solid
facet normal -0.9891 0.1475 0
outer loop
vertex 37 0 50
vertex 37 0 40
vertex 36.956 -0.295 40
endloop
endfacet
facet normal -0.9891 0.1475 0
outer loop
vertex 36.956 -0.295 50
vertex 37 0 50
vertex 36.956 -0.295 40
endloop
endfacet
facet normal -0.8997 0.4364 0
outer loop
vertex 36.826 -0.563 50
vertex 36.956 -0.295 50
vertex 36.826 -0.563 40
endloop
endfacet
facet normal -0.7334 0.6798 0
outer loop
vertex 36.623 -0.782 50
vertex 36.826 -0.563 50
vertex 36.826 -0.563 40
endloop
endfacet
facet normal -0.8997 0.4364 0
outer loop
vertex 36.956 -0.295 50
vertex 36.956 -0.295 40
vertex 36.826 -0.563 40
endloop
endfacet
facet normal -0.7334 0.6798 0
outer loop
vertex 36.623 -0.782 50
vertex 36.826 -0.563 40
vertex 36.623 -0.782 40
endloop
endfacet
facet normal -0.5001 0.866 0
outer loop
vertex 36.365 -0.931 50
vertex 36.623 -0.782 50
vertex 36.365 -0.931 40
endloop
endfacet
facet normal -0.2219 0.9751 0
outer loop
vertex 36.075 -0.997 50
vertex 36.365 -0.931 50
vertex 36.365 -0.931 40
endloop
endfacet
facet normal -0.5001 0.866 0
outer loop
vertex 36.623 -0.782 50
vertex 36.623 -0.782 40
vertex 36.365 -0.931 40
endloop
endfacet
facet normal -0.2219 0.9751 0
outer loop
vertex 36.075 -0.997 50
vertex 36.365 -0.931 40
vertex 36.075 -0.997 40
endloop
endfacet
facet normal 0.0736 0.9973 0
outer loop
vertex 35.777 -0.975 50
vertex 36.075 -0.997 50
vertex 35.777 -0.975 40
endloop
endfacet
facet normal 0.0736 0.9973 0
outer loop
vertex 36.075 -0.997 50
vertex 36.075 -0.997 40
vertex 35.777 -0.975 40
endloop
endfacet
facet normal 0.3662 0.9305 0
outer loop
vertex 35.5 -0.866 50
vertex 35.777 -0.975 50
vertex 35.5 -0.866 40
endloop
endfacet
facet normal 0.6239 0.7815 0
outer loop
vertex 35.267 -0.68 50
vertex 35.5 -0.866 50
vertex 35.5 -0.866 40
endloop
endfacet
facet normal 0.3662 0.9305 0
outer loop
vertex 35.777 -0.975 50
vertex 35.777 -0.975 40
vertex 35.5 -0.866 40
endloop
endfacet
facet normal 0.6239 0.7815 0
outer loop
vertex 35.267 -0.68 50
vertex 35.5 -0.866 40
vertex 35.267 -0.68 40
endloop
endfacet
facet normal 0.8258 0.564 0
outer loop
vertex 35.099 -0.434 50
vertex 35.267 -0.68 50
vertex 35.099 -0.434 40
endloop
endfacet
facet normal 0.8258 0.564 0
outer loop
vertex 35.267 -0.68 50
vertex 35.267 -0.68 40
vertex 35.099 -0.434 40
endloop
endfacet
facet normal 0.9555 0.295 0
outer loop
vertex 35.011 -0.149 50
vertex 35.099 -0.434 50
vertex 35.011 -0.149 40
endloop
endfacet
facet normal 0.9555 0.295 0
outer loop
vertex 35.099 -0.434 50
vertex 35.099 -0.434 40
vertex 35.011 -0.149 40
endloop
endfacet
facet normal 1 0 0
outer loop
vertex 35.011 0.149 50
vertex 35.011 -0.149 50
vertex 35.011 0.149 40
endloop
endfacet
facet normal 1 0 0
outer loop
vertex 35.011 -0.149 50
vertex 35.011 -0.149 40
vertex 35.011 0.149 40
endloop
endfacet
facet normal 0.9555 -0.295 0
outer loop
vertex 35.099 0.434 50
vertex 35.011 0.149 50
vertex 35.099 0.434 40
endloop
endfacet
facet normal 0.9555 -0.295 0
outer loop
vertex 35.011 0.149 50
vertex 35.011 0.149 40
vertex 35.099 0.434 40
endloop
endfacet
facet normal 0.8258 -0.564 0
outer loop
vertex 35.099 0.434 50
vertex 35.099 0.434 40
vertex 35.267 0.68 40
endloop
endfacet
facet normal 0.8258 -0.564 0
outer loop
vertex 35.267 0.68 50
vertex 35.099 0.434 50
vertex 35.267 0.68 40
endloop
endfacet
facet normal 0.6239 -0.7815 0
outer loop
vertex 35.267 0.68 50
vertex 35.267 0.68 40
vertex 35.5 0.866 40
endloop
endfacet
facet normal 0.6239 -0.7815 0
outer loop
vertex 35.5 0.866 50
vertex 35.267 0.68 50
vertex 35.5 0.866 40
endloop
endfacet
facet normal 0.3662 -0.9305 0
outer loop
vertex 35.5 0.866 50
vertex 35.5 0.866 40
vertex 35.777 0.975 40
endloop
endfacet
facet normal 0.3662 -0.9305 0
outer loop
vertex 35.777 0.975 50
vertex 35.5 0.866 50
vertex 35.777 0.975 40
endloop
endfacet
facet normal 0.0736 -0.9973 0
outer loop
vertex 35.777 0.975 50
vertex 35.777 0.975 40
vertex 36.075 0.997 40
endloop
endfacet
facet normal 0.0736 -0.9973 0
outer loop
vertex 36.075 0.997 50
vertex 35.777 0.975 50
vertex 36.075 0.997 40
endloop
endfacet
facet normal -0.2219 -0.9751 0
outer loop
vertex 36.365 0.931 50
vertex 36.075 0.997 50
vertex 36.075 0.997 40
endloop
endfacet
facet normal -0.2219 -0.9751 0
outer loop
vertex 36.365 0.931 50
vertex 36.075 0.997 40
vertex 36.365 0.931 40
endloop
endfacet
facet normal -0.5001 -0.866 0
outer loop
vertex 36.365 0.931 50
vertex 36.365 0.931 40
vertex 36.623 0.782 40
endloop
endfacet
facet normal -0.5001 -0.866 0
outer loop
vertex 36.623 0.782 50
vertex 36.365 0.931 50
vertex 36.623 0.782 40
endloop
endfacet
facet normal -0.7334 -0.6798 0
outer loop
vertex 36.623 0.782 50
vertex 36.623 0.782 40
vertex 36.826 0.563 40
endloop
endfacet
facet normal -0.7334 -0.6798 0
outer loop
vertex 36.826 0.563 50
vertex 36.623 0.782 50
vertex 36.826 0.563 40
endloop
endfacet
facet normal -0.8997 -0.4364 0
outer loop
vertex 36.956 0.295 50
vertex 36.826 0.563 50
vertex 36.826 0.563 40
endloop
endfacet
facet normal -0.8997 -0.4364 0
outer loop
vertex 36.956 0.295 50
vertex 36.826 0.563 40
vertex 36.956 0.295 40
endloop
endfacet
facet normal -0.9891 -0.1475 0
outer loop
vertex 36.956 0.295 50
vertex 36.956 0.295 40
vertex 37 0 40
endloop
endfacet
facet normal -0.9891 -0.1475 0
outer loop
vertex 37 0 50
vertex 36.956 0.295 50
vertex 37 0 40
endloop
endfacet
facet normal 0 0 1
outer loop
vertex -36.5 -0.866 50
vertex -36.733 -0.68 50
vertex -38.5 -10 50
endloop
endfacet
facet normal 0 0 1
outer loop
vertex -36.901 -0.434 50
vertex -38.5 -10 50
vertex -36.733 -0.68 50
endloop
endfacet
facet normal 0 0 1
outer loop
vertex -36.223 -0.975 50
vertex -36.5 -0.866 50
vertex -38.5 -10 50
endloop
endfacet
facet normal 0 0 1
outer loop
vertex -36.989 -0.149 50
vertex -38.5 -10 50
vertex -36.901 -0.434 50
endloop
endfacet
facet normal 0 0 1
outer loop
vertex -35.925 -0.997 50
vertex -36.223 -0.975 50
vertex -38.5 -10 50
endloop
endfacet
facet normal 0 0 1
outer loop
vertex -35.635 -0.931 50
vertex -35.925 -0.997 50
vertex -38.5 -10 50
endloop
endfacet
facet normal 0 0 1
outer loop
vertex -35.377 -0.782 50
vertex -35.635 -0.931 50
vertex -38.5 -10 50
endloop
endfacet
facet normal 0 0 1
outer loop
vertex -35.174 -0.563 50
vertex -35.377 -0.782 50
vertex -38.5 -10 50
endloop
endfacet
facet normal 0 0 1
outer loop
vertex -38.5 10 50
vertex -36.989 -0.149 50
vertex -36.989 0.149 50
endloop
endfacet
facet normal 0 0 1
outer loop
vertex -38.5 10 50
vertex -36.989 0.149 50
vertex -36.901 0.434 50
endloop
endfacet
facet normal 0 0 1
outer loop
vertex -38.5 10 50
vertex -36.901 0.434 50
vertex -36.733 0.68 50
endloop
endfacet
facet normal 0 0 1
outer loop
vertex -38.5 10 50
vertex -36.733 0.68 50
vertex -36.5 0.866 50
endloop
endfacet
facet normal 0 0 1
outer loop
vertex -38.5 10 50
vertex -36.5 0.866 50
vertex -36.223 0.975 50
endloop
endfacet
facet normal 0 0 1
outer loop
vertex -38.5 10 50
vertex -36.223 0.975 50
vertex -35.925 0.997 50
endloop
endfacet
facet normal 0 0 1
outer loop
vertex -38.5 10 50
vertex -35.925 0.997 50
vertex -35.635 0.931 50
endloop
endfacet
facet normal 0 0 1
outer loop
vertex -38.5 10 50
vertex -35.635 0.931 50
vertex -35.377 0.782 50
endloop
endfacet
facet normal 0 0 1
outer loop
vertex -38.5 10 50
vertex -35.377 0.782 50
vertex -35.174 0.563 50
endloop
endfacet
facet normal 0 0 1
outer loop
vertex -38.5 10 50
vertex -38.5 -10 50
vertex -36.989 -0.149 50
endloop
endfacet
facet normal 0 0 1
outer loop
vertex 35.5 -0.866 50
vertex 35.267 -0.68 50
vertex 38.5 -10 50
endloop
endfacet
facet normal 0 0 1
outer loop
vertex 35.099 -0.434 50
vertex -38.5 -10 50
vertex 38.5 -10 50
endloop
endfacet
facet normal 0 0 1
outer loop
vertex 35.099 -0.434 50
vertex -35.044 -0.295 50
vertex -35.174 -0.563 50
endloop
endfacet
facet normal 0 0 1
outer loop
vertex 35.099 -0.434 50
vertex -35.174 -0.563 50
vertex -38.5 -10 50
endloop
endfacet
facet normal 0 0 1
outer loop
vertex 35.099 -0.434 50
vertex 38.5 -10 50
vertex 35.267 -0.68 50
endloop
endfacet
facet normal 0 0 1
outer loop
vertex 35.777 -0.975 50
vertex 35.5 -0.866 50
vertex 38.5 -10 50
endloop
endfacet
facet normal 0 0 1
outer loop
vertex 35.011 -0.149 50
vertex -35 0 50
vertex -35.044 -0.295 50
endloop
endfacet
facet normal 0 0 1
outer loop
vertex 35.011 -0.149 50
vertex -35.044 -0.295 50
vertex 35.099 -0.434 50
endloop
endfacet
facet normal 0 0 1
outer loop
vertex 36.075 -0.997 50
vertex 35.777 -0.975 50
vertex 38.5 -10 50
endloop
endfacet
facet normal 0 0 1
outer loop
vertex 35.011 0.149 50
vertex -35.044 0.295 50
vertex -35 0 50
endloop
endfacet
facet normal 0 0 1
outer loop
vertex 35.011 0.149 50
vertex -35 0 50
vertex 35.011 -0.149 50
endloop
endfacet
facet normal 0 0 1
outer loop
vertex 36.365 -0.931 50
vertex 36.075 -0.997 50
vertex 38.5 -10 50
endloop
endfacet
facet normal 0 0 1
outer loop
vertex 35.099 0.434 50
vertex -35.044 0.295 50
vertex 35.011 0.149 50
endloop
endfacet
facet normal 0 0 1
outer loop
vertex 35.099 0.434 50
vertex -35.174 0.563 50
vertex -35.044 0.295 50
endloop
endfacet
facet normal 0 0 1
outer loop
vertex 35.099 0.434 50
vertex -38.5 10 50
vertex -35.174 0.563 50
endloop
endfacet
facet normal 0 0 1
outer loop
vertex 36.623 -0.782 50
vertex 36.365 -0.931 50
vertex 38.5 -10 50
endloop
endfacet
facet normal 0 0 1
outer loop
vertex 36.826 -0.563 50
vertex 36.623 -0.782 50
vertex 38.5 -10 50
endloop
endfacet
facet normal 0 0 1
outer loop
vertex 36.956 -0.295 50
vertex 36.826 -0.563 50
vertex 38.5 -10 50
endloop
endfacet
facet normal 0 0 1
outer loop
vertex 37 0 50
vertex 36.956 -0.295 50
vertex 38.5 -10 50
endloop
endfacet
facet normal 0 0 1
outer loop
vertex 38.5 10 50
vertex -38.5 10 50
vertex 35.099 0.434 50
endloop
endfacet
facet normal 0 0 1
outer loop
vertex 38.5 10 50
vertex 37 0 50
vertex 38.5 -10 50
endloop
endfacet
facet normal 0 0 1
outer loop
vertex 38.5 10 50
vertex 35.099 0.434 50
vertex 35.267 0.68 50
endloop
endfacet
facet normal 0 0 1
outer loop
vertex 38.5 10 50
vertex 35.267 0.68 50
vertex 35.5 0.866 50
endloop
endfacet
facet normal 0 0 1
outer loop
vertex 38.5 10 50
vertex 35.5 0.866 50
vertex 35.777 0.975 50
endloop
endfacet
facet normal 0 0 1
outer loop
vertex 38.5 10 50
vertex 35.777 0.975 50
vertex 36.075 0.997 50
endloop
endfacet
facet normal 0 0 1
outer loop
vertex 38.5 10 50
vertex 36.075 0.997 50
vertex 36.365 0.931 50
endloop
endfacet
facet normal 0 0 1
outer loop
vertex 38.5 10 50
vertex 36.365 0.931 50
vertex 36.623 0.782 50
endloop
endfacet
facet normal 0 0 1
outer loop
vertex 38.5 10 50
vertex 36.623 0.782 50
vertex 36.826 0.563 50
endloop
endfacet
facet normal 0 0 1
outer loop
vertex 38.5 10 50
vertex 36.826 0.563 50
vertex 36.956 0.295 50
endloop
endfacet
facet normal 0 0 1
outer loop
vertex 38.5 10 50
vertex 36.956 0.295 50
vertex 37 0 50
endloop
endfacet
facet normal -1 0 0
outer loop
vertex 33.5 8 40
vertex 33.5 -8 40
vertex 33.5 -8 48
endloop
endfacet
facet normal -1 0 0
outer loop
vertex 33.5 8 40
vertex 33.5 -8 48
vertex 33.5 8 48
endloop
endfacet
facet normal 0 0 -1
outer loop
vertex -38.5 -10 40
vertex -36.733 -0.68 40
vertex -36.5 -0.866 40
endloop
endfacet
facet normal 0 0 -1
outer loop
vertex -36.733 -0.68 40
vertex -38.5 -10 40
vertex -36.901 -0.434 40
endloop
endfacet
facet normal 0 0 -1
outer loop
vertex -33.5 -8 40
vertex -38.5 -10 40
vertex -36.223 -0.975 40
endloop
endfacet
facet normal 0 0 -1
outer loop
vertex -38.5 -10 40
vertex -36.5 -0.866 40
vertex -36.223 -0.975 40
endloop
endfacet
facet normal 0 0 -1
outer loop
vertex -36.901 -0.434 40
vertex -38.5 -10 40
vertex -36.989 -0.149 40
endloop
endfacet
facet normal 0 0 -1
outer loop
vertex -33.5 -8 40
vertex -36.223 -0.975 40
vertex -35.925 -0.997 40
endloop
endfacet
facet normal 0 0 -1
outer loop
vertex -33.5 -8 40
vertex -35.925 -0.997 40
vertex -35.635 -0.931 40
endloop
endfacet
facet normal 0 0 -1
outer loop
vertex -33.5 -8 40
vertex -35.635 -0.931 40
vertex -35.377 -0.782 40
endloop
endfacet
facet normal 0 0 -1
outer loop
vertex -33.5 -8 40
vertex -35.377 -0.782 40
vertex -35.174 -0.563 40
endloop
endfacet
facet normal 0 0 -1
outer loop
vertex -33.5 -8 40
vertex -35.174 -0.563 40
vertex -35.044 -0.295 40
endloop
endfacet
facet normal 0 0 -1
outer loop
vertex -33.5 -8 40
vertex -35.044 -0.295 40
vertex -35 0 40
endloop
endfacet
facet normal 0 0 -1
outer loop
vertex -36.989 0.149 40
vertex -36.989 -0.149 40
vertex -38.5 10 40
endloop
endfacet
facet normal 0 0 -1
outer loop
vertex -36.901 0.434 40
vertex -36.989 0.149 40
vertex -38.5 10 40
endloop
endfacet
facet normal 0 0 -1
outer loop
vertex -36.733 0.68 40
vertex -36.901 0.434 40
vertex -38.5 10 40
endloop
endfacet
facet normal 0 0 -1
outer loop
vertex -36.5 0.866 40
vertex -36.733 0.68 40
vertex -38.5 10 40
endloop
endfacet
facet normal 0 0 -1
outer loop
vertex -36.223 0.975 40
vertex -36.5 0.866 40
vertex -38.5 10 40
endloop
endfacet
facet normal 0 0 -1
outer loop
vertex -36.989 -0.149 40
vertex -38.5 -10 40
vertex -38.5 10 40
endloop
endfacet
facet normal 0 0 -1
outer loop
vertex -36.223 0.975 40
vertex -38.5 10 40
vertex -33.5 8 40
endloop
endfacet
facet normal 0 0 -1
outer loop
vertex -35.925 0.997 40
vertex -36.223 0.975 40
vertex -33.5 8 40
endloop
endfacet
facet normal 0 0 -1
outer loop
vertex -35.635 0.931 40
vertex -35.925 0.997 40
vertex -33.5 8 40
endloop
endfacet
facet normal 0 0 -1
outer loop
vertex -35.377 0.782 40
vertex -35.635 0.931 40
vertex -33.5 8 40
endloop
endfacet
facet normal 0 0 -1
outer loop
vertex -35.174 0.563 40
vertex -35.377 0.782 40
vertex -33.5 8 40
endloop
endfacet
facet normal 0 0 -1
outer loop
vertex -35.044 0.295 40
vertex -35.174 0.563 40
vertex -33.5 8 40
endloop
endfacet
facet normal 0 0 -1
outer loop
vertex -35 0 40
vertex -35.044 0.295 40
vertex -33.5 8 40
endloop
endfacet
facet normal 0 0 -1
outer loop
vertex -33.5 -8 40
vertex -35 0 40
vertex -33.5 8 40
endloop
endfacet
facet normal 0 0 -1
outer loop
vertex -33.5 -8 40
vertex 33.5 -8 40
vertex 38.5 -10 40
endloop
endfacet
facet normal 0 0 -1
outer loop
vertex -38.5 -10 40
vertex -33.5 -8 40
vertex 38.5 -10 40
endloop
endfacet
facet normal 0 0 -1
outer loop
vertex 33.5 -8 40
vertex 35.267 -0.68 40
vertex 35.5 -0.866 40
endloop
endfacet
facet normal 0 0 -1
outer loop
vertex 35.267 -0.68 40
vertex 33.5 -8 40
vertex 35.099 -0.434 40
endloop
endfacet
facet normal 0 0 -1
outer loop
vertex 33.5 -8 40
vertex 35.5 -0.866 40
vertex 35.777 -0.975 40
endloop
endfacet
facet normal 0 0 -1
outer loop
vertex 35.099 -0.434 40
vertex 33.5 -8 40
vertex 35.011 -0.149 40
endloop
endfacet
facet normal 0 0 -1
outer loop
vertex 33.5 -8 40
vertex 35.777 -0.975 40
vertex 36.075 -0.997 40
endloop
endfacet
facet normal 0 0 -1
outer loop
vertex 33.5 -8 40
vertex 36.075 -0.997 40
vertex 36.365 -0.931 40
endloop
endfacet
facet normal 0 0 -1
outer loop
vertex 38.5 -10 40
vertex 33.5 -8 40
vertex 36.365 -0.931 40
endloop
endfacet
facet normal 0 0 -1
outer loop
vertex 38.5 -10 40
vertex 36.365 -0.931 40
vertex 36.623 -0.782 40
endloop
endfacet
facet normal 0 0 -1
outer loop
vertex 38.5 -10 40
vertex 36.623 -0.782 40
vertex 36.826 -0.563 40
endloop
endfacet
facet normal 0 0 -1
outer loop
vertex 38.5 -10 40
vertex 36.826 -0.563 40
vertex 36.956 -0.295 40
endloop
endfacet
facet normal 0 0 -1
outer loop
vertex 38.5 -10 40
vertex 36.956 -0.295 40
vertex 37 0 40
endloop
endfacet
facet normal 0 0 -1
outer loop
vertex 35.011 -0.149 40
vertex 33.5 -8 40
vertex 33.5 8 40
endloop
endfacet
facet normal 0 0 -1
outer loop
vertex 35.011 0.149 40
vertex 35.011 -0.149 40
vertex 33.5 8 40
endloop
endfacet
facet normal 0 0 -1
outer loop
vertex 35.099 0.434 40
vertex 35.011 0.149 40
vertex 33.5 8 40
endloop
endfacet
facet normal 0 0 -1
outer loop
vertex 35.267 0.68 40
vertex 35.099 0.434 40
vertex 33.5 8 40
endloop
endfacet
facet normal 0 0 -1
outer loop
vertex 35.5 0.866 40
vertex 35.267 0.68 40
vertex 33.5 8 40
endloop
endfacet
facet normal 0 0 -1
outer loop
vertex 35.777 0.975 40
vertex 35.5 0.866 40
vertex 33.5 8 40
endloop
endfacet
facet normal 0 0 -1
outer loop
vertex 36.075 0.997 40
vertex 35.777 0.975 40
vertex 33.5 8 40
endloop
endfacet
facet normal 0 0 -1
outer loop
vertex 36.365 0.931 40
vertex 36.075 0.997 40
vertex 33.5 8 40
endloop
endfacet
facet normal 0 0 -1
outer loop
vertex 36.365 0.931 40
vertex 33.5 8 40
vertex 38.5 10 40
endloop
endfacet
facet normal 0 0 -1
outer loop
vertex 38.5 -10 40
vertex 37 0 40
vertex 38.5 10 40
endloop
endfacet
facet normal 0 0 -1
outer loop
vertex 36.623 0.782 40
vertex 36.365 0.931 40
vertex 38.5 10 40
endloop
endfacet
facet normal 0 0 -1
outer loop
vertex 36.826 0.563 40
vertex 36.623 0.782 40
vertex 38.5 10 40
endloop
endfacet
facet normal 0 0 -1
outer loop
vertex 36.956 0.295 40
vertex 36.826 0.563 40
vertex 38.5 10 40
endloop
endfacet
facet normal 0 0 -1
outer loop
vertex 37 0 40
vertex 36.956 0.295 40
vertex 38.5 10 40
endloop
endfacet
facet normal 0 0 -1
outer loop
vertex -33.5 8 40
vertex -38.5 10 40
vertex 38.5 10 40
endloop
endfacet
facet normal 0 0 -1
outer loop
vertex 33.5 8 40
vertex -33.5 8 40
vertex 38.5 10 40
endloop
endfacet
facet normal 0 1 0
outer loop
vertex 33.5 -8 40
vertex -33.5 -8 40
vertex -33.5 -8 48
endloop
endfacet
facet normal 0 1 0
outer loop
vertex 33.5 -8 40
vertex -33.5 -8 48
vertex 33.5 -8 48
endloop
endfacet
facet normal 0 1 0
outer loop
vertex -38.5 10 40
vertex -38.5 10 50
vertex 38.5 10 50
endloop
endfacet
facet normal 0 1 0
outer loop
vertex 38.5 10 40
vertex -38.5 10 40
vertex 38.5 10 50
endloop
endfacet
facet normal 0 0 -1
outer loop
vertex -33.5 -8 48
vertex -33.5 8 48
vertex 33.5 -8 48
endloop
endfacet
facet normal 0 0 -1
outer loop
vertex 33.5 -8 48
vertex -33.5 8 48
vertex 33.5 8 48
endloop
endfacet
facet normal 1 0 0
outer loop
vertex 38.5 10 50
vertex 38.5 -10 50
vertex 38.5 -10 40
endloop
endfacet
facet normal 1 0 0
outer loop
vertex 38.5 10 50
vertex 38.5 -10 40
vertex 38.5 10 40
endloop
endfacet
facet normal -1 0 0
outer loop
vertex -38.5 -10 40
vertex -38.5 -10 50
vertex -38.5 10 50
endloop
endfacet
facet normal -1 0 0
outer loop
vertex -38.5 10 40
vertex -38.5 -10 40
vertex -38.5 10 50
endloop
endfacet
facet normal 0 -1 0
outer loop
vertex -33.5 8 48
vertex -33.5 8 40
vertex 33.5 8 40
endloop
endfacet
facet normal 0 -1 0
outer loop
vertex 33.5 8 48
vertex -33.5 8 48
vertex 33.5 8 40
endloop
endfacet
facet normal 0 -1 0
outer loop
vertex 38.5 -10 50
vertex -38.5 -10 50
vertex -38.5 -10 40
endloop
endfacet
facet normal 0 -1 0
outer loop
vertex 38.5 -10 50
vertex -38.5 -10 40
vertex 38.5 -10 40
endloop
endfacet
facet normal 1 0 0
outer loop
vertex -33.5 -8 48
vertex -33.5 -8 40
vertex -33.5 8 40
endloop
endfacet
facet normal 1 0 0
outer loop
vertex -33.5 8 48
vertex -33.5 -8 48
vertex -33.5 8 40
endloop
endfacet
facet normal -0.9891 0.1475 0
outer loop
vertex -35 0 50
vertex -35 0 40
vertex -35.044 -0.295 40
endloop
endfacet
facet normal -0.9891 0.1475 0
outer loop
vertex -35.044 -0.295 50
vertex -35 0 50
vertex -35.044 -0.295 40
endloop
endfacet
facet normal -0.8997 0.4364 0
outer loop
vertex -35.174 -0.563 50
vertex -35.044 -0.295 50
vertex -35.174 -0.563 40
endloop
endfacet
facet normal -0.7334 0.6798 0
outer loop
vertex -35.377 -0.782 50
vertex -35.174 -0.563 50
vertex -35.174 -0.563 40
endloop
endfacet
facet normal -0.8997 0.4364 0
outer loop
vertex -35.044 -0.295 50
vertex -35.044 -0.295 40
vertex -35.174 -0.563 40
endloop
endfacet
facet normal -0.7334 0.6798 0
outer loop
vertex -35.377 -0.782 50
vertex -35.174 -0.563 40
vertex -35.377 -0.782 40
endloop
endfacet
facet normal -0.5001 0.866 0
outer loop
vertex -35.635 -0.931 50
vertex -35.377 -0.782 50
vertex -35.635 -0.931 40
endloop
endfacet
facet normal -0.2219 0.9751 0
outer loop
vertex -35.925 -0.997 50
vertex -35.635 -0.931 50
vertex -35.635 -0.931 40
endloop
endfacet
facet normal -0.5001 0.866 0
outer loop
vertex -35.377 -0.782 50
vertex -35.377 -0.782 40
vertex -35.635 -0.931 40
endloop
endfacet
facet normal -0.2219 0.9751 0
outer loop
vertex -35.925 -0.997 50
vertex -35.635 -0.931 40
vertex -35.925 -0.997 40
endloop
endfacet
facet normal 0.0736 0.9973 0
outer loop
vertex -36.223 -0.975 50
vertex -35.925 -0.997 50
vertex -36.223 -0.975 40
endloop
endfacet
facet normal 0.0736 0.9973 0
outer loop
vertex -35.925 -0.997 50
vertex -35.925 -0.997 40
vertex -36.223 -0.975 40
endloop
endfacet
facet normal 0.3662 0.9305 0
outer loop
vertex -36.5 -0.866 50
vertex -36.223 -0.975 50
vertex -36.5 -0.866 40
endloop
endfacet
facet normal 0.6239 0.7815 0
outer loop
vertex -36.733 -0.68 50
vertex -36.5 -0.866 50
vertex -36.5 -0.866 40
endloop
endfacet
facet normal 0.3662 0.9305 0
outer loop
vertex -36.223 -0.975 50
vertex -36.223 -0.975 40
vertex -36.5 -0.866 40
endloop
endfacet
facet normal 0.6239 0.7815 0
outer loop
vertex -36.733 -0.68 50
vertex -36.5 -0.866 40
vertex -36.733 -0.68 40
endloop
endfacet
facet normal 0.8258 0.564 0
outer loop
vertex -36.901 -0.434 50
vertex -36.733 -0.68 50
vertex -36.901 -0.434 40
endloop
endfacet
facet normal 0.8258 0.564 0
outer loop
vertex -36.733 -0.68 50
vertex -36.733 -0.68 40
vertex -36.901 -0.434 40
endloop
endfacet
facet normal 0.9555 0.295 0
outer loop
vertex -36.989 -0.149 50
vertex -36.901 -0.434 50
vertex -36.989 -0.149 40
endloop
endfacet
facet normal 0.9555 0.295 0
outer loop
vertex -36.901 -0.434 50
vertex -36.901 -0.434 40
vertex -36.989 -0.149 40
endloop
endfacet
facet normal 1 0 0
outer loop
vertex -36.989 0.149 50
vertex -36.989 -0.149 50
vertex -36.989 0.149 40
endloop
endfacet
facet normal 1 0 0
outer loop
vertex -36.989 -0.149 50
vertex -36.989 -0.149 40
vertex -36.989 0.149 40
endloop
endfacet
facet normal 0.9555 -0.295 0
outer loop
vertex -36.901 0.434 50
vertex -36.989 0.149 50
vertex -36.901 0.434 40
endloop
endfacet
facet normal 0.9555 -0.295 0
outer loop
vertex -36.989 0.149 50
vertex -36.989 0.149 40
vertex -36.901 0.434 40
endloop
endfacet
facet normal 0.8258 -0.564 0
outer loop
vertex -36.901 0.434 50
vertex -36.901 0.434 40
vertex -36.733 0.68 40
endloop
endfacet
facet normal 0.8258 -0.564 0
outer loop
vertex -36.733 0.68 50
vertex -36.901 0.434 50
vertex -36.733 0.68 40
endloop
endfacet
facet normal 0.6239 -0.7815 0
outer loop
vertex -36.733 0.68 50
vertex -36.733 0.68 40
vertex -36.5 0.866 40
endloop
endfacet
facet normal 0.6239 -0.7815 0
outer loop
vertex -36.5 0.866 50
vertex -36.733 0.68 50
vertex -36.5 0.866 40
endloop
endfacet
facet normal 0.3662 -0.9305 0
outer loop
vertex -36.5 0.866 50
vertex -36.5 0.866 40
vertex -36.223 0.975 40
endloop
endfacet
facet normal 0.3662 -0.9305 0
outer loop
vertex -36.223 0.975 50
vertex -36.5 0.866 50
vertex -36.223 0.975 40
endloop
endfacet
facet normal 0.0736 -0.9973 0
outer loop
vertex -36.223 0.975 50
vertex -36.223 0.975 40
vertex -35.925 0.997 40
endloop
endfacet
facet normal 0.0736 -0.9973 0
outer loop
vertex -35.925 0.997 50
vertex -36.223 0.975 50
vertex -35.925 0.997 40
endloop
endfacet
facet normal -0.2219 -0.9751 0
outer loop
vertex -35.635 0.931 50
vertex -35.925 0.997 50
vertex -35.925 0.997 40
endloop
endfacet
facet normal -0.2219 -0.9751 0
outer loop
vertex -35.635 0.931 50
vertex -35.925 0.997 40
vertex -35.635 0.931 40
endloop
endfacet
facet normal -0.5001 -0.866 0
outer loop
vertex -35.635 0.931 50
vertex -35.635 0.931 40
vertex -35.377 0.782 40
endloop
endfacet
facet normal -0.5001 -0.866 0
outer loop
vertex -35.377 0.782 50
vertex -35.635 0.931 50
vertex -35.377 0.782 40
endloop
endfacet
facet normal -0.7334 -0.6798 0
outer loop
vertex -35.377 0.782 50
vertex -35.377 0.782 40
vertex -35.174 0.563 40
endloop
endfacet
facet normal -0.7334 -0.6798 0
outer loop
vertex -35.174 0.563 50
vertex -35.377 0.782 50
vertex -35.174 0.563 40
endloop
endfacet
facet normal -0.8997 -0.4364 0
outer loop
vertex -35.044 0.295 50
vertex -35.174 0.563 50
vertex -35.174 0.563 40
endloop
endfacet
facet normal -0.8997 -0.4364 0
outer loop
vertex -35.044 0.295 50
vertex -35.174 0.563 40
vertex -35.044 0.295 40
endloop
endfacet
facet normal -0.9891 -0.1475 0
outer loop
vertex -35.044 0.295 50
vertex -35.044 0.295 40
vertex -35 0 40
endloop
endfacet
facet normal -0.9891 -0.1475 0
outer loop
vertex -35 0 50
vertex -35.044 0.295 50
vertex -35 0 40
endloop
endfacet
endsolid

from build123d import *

# Parameters (mm, degrees)
F0_W     = 77
F0_H     = 20
F1_DEPTH = 10
F2_W     = 67
F2_H     = 16
F3_DEPTH = 8
F7_R     = 1
F8_DEPTH = 25


with BuildPart() as f1:
    # F0 (on Top) → F1 (new body)
    with BuildSketch(Plane.XY):
        Rectangle(F0_W, F0_H)
    extrude(amount=F1_DEPTH)

    # F2 (on face) → F3 (cut)
    with BuildSketch(Plane.XY.offset(10)):
        Rectangle(F2_W, F2_H)
    extrude(amount=-F3_DEPTH, mode=Mode.SUBTRACT)


with BuildPart() as f5_1:
    # F5: instance of F1
    add(f1.part.mirror(Plane.XY.offset(25)))

    # F7 (on face) → F8 (cut)
    with BuildSketch(Plane(origin=(0, 0, 40), x_dir=(1, 0, 0), z_dir=(0, 0, -1))):
        with Locations((36, 0)):
            Circle(F7_R)
        with Locations((-36, 0)):
            Circle(F7_R)
    extrude(amount=-F8_DEPTH, mode=Mode.SUBTRACT)


solid = f5_1.part
